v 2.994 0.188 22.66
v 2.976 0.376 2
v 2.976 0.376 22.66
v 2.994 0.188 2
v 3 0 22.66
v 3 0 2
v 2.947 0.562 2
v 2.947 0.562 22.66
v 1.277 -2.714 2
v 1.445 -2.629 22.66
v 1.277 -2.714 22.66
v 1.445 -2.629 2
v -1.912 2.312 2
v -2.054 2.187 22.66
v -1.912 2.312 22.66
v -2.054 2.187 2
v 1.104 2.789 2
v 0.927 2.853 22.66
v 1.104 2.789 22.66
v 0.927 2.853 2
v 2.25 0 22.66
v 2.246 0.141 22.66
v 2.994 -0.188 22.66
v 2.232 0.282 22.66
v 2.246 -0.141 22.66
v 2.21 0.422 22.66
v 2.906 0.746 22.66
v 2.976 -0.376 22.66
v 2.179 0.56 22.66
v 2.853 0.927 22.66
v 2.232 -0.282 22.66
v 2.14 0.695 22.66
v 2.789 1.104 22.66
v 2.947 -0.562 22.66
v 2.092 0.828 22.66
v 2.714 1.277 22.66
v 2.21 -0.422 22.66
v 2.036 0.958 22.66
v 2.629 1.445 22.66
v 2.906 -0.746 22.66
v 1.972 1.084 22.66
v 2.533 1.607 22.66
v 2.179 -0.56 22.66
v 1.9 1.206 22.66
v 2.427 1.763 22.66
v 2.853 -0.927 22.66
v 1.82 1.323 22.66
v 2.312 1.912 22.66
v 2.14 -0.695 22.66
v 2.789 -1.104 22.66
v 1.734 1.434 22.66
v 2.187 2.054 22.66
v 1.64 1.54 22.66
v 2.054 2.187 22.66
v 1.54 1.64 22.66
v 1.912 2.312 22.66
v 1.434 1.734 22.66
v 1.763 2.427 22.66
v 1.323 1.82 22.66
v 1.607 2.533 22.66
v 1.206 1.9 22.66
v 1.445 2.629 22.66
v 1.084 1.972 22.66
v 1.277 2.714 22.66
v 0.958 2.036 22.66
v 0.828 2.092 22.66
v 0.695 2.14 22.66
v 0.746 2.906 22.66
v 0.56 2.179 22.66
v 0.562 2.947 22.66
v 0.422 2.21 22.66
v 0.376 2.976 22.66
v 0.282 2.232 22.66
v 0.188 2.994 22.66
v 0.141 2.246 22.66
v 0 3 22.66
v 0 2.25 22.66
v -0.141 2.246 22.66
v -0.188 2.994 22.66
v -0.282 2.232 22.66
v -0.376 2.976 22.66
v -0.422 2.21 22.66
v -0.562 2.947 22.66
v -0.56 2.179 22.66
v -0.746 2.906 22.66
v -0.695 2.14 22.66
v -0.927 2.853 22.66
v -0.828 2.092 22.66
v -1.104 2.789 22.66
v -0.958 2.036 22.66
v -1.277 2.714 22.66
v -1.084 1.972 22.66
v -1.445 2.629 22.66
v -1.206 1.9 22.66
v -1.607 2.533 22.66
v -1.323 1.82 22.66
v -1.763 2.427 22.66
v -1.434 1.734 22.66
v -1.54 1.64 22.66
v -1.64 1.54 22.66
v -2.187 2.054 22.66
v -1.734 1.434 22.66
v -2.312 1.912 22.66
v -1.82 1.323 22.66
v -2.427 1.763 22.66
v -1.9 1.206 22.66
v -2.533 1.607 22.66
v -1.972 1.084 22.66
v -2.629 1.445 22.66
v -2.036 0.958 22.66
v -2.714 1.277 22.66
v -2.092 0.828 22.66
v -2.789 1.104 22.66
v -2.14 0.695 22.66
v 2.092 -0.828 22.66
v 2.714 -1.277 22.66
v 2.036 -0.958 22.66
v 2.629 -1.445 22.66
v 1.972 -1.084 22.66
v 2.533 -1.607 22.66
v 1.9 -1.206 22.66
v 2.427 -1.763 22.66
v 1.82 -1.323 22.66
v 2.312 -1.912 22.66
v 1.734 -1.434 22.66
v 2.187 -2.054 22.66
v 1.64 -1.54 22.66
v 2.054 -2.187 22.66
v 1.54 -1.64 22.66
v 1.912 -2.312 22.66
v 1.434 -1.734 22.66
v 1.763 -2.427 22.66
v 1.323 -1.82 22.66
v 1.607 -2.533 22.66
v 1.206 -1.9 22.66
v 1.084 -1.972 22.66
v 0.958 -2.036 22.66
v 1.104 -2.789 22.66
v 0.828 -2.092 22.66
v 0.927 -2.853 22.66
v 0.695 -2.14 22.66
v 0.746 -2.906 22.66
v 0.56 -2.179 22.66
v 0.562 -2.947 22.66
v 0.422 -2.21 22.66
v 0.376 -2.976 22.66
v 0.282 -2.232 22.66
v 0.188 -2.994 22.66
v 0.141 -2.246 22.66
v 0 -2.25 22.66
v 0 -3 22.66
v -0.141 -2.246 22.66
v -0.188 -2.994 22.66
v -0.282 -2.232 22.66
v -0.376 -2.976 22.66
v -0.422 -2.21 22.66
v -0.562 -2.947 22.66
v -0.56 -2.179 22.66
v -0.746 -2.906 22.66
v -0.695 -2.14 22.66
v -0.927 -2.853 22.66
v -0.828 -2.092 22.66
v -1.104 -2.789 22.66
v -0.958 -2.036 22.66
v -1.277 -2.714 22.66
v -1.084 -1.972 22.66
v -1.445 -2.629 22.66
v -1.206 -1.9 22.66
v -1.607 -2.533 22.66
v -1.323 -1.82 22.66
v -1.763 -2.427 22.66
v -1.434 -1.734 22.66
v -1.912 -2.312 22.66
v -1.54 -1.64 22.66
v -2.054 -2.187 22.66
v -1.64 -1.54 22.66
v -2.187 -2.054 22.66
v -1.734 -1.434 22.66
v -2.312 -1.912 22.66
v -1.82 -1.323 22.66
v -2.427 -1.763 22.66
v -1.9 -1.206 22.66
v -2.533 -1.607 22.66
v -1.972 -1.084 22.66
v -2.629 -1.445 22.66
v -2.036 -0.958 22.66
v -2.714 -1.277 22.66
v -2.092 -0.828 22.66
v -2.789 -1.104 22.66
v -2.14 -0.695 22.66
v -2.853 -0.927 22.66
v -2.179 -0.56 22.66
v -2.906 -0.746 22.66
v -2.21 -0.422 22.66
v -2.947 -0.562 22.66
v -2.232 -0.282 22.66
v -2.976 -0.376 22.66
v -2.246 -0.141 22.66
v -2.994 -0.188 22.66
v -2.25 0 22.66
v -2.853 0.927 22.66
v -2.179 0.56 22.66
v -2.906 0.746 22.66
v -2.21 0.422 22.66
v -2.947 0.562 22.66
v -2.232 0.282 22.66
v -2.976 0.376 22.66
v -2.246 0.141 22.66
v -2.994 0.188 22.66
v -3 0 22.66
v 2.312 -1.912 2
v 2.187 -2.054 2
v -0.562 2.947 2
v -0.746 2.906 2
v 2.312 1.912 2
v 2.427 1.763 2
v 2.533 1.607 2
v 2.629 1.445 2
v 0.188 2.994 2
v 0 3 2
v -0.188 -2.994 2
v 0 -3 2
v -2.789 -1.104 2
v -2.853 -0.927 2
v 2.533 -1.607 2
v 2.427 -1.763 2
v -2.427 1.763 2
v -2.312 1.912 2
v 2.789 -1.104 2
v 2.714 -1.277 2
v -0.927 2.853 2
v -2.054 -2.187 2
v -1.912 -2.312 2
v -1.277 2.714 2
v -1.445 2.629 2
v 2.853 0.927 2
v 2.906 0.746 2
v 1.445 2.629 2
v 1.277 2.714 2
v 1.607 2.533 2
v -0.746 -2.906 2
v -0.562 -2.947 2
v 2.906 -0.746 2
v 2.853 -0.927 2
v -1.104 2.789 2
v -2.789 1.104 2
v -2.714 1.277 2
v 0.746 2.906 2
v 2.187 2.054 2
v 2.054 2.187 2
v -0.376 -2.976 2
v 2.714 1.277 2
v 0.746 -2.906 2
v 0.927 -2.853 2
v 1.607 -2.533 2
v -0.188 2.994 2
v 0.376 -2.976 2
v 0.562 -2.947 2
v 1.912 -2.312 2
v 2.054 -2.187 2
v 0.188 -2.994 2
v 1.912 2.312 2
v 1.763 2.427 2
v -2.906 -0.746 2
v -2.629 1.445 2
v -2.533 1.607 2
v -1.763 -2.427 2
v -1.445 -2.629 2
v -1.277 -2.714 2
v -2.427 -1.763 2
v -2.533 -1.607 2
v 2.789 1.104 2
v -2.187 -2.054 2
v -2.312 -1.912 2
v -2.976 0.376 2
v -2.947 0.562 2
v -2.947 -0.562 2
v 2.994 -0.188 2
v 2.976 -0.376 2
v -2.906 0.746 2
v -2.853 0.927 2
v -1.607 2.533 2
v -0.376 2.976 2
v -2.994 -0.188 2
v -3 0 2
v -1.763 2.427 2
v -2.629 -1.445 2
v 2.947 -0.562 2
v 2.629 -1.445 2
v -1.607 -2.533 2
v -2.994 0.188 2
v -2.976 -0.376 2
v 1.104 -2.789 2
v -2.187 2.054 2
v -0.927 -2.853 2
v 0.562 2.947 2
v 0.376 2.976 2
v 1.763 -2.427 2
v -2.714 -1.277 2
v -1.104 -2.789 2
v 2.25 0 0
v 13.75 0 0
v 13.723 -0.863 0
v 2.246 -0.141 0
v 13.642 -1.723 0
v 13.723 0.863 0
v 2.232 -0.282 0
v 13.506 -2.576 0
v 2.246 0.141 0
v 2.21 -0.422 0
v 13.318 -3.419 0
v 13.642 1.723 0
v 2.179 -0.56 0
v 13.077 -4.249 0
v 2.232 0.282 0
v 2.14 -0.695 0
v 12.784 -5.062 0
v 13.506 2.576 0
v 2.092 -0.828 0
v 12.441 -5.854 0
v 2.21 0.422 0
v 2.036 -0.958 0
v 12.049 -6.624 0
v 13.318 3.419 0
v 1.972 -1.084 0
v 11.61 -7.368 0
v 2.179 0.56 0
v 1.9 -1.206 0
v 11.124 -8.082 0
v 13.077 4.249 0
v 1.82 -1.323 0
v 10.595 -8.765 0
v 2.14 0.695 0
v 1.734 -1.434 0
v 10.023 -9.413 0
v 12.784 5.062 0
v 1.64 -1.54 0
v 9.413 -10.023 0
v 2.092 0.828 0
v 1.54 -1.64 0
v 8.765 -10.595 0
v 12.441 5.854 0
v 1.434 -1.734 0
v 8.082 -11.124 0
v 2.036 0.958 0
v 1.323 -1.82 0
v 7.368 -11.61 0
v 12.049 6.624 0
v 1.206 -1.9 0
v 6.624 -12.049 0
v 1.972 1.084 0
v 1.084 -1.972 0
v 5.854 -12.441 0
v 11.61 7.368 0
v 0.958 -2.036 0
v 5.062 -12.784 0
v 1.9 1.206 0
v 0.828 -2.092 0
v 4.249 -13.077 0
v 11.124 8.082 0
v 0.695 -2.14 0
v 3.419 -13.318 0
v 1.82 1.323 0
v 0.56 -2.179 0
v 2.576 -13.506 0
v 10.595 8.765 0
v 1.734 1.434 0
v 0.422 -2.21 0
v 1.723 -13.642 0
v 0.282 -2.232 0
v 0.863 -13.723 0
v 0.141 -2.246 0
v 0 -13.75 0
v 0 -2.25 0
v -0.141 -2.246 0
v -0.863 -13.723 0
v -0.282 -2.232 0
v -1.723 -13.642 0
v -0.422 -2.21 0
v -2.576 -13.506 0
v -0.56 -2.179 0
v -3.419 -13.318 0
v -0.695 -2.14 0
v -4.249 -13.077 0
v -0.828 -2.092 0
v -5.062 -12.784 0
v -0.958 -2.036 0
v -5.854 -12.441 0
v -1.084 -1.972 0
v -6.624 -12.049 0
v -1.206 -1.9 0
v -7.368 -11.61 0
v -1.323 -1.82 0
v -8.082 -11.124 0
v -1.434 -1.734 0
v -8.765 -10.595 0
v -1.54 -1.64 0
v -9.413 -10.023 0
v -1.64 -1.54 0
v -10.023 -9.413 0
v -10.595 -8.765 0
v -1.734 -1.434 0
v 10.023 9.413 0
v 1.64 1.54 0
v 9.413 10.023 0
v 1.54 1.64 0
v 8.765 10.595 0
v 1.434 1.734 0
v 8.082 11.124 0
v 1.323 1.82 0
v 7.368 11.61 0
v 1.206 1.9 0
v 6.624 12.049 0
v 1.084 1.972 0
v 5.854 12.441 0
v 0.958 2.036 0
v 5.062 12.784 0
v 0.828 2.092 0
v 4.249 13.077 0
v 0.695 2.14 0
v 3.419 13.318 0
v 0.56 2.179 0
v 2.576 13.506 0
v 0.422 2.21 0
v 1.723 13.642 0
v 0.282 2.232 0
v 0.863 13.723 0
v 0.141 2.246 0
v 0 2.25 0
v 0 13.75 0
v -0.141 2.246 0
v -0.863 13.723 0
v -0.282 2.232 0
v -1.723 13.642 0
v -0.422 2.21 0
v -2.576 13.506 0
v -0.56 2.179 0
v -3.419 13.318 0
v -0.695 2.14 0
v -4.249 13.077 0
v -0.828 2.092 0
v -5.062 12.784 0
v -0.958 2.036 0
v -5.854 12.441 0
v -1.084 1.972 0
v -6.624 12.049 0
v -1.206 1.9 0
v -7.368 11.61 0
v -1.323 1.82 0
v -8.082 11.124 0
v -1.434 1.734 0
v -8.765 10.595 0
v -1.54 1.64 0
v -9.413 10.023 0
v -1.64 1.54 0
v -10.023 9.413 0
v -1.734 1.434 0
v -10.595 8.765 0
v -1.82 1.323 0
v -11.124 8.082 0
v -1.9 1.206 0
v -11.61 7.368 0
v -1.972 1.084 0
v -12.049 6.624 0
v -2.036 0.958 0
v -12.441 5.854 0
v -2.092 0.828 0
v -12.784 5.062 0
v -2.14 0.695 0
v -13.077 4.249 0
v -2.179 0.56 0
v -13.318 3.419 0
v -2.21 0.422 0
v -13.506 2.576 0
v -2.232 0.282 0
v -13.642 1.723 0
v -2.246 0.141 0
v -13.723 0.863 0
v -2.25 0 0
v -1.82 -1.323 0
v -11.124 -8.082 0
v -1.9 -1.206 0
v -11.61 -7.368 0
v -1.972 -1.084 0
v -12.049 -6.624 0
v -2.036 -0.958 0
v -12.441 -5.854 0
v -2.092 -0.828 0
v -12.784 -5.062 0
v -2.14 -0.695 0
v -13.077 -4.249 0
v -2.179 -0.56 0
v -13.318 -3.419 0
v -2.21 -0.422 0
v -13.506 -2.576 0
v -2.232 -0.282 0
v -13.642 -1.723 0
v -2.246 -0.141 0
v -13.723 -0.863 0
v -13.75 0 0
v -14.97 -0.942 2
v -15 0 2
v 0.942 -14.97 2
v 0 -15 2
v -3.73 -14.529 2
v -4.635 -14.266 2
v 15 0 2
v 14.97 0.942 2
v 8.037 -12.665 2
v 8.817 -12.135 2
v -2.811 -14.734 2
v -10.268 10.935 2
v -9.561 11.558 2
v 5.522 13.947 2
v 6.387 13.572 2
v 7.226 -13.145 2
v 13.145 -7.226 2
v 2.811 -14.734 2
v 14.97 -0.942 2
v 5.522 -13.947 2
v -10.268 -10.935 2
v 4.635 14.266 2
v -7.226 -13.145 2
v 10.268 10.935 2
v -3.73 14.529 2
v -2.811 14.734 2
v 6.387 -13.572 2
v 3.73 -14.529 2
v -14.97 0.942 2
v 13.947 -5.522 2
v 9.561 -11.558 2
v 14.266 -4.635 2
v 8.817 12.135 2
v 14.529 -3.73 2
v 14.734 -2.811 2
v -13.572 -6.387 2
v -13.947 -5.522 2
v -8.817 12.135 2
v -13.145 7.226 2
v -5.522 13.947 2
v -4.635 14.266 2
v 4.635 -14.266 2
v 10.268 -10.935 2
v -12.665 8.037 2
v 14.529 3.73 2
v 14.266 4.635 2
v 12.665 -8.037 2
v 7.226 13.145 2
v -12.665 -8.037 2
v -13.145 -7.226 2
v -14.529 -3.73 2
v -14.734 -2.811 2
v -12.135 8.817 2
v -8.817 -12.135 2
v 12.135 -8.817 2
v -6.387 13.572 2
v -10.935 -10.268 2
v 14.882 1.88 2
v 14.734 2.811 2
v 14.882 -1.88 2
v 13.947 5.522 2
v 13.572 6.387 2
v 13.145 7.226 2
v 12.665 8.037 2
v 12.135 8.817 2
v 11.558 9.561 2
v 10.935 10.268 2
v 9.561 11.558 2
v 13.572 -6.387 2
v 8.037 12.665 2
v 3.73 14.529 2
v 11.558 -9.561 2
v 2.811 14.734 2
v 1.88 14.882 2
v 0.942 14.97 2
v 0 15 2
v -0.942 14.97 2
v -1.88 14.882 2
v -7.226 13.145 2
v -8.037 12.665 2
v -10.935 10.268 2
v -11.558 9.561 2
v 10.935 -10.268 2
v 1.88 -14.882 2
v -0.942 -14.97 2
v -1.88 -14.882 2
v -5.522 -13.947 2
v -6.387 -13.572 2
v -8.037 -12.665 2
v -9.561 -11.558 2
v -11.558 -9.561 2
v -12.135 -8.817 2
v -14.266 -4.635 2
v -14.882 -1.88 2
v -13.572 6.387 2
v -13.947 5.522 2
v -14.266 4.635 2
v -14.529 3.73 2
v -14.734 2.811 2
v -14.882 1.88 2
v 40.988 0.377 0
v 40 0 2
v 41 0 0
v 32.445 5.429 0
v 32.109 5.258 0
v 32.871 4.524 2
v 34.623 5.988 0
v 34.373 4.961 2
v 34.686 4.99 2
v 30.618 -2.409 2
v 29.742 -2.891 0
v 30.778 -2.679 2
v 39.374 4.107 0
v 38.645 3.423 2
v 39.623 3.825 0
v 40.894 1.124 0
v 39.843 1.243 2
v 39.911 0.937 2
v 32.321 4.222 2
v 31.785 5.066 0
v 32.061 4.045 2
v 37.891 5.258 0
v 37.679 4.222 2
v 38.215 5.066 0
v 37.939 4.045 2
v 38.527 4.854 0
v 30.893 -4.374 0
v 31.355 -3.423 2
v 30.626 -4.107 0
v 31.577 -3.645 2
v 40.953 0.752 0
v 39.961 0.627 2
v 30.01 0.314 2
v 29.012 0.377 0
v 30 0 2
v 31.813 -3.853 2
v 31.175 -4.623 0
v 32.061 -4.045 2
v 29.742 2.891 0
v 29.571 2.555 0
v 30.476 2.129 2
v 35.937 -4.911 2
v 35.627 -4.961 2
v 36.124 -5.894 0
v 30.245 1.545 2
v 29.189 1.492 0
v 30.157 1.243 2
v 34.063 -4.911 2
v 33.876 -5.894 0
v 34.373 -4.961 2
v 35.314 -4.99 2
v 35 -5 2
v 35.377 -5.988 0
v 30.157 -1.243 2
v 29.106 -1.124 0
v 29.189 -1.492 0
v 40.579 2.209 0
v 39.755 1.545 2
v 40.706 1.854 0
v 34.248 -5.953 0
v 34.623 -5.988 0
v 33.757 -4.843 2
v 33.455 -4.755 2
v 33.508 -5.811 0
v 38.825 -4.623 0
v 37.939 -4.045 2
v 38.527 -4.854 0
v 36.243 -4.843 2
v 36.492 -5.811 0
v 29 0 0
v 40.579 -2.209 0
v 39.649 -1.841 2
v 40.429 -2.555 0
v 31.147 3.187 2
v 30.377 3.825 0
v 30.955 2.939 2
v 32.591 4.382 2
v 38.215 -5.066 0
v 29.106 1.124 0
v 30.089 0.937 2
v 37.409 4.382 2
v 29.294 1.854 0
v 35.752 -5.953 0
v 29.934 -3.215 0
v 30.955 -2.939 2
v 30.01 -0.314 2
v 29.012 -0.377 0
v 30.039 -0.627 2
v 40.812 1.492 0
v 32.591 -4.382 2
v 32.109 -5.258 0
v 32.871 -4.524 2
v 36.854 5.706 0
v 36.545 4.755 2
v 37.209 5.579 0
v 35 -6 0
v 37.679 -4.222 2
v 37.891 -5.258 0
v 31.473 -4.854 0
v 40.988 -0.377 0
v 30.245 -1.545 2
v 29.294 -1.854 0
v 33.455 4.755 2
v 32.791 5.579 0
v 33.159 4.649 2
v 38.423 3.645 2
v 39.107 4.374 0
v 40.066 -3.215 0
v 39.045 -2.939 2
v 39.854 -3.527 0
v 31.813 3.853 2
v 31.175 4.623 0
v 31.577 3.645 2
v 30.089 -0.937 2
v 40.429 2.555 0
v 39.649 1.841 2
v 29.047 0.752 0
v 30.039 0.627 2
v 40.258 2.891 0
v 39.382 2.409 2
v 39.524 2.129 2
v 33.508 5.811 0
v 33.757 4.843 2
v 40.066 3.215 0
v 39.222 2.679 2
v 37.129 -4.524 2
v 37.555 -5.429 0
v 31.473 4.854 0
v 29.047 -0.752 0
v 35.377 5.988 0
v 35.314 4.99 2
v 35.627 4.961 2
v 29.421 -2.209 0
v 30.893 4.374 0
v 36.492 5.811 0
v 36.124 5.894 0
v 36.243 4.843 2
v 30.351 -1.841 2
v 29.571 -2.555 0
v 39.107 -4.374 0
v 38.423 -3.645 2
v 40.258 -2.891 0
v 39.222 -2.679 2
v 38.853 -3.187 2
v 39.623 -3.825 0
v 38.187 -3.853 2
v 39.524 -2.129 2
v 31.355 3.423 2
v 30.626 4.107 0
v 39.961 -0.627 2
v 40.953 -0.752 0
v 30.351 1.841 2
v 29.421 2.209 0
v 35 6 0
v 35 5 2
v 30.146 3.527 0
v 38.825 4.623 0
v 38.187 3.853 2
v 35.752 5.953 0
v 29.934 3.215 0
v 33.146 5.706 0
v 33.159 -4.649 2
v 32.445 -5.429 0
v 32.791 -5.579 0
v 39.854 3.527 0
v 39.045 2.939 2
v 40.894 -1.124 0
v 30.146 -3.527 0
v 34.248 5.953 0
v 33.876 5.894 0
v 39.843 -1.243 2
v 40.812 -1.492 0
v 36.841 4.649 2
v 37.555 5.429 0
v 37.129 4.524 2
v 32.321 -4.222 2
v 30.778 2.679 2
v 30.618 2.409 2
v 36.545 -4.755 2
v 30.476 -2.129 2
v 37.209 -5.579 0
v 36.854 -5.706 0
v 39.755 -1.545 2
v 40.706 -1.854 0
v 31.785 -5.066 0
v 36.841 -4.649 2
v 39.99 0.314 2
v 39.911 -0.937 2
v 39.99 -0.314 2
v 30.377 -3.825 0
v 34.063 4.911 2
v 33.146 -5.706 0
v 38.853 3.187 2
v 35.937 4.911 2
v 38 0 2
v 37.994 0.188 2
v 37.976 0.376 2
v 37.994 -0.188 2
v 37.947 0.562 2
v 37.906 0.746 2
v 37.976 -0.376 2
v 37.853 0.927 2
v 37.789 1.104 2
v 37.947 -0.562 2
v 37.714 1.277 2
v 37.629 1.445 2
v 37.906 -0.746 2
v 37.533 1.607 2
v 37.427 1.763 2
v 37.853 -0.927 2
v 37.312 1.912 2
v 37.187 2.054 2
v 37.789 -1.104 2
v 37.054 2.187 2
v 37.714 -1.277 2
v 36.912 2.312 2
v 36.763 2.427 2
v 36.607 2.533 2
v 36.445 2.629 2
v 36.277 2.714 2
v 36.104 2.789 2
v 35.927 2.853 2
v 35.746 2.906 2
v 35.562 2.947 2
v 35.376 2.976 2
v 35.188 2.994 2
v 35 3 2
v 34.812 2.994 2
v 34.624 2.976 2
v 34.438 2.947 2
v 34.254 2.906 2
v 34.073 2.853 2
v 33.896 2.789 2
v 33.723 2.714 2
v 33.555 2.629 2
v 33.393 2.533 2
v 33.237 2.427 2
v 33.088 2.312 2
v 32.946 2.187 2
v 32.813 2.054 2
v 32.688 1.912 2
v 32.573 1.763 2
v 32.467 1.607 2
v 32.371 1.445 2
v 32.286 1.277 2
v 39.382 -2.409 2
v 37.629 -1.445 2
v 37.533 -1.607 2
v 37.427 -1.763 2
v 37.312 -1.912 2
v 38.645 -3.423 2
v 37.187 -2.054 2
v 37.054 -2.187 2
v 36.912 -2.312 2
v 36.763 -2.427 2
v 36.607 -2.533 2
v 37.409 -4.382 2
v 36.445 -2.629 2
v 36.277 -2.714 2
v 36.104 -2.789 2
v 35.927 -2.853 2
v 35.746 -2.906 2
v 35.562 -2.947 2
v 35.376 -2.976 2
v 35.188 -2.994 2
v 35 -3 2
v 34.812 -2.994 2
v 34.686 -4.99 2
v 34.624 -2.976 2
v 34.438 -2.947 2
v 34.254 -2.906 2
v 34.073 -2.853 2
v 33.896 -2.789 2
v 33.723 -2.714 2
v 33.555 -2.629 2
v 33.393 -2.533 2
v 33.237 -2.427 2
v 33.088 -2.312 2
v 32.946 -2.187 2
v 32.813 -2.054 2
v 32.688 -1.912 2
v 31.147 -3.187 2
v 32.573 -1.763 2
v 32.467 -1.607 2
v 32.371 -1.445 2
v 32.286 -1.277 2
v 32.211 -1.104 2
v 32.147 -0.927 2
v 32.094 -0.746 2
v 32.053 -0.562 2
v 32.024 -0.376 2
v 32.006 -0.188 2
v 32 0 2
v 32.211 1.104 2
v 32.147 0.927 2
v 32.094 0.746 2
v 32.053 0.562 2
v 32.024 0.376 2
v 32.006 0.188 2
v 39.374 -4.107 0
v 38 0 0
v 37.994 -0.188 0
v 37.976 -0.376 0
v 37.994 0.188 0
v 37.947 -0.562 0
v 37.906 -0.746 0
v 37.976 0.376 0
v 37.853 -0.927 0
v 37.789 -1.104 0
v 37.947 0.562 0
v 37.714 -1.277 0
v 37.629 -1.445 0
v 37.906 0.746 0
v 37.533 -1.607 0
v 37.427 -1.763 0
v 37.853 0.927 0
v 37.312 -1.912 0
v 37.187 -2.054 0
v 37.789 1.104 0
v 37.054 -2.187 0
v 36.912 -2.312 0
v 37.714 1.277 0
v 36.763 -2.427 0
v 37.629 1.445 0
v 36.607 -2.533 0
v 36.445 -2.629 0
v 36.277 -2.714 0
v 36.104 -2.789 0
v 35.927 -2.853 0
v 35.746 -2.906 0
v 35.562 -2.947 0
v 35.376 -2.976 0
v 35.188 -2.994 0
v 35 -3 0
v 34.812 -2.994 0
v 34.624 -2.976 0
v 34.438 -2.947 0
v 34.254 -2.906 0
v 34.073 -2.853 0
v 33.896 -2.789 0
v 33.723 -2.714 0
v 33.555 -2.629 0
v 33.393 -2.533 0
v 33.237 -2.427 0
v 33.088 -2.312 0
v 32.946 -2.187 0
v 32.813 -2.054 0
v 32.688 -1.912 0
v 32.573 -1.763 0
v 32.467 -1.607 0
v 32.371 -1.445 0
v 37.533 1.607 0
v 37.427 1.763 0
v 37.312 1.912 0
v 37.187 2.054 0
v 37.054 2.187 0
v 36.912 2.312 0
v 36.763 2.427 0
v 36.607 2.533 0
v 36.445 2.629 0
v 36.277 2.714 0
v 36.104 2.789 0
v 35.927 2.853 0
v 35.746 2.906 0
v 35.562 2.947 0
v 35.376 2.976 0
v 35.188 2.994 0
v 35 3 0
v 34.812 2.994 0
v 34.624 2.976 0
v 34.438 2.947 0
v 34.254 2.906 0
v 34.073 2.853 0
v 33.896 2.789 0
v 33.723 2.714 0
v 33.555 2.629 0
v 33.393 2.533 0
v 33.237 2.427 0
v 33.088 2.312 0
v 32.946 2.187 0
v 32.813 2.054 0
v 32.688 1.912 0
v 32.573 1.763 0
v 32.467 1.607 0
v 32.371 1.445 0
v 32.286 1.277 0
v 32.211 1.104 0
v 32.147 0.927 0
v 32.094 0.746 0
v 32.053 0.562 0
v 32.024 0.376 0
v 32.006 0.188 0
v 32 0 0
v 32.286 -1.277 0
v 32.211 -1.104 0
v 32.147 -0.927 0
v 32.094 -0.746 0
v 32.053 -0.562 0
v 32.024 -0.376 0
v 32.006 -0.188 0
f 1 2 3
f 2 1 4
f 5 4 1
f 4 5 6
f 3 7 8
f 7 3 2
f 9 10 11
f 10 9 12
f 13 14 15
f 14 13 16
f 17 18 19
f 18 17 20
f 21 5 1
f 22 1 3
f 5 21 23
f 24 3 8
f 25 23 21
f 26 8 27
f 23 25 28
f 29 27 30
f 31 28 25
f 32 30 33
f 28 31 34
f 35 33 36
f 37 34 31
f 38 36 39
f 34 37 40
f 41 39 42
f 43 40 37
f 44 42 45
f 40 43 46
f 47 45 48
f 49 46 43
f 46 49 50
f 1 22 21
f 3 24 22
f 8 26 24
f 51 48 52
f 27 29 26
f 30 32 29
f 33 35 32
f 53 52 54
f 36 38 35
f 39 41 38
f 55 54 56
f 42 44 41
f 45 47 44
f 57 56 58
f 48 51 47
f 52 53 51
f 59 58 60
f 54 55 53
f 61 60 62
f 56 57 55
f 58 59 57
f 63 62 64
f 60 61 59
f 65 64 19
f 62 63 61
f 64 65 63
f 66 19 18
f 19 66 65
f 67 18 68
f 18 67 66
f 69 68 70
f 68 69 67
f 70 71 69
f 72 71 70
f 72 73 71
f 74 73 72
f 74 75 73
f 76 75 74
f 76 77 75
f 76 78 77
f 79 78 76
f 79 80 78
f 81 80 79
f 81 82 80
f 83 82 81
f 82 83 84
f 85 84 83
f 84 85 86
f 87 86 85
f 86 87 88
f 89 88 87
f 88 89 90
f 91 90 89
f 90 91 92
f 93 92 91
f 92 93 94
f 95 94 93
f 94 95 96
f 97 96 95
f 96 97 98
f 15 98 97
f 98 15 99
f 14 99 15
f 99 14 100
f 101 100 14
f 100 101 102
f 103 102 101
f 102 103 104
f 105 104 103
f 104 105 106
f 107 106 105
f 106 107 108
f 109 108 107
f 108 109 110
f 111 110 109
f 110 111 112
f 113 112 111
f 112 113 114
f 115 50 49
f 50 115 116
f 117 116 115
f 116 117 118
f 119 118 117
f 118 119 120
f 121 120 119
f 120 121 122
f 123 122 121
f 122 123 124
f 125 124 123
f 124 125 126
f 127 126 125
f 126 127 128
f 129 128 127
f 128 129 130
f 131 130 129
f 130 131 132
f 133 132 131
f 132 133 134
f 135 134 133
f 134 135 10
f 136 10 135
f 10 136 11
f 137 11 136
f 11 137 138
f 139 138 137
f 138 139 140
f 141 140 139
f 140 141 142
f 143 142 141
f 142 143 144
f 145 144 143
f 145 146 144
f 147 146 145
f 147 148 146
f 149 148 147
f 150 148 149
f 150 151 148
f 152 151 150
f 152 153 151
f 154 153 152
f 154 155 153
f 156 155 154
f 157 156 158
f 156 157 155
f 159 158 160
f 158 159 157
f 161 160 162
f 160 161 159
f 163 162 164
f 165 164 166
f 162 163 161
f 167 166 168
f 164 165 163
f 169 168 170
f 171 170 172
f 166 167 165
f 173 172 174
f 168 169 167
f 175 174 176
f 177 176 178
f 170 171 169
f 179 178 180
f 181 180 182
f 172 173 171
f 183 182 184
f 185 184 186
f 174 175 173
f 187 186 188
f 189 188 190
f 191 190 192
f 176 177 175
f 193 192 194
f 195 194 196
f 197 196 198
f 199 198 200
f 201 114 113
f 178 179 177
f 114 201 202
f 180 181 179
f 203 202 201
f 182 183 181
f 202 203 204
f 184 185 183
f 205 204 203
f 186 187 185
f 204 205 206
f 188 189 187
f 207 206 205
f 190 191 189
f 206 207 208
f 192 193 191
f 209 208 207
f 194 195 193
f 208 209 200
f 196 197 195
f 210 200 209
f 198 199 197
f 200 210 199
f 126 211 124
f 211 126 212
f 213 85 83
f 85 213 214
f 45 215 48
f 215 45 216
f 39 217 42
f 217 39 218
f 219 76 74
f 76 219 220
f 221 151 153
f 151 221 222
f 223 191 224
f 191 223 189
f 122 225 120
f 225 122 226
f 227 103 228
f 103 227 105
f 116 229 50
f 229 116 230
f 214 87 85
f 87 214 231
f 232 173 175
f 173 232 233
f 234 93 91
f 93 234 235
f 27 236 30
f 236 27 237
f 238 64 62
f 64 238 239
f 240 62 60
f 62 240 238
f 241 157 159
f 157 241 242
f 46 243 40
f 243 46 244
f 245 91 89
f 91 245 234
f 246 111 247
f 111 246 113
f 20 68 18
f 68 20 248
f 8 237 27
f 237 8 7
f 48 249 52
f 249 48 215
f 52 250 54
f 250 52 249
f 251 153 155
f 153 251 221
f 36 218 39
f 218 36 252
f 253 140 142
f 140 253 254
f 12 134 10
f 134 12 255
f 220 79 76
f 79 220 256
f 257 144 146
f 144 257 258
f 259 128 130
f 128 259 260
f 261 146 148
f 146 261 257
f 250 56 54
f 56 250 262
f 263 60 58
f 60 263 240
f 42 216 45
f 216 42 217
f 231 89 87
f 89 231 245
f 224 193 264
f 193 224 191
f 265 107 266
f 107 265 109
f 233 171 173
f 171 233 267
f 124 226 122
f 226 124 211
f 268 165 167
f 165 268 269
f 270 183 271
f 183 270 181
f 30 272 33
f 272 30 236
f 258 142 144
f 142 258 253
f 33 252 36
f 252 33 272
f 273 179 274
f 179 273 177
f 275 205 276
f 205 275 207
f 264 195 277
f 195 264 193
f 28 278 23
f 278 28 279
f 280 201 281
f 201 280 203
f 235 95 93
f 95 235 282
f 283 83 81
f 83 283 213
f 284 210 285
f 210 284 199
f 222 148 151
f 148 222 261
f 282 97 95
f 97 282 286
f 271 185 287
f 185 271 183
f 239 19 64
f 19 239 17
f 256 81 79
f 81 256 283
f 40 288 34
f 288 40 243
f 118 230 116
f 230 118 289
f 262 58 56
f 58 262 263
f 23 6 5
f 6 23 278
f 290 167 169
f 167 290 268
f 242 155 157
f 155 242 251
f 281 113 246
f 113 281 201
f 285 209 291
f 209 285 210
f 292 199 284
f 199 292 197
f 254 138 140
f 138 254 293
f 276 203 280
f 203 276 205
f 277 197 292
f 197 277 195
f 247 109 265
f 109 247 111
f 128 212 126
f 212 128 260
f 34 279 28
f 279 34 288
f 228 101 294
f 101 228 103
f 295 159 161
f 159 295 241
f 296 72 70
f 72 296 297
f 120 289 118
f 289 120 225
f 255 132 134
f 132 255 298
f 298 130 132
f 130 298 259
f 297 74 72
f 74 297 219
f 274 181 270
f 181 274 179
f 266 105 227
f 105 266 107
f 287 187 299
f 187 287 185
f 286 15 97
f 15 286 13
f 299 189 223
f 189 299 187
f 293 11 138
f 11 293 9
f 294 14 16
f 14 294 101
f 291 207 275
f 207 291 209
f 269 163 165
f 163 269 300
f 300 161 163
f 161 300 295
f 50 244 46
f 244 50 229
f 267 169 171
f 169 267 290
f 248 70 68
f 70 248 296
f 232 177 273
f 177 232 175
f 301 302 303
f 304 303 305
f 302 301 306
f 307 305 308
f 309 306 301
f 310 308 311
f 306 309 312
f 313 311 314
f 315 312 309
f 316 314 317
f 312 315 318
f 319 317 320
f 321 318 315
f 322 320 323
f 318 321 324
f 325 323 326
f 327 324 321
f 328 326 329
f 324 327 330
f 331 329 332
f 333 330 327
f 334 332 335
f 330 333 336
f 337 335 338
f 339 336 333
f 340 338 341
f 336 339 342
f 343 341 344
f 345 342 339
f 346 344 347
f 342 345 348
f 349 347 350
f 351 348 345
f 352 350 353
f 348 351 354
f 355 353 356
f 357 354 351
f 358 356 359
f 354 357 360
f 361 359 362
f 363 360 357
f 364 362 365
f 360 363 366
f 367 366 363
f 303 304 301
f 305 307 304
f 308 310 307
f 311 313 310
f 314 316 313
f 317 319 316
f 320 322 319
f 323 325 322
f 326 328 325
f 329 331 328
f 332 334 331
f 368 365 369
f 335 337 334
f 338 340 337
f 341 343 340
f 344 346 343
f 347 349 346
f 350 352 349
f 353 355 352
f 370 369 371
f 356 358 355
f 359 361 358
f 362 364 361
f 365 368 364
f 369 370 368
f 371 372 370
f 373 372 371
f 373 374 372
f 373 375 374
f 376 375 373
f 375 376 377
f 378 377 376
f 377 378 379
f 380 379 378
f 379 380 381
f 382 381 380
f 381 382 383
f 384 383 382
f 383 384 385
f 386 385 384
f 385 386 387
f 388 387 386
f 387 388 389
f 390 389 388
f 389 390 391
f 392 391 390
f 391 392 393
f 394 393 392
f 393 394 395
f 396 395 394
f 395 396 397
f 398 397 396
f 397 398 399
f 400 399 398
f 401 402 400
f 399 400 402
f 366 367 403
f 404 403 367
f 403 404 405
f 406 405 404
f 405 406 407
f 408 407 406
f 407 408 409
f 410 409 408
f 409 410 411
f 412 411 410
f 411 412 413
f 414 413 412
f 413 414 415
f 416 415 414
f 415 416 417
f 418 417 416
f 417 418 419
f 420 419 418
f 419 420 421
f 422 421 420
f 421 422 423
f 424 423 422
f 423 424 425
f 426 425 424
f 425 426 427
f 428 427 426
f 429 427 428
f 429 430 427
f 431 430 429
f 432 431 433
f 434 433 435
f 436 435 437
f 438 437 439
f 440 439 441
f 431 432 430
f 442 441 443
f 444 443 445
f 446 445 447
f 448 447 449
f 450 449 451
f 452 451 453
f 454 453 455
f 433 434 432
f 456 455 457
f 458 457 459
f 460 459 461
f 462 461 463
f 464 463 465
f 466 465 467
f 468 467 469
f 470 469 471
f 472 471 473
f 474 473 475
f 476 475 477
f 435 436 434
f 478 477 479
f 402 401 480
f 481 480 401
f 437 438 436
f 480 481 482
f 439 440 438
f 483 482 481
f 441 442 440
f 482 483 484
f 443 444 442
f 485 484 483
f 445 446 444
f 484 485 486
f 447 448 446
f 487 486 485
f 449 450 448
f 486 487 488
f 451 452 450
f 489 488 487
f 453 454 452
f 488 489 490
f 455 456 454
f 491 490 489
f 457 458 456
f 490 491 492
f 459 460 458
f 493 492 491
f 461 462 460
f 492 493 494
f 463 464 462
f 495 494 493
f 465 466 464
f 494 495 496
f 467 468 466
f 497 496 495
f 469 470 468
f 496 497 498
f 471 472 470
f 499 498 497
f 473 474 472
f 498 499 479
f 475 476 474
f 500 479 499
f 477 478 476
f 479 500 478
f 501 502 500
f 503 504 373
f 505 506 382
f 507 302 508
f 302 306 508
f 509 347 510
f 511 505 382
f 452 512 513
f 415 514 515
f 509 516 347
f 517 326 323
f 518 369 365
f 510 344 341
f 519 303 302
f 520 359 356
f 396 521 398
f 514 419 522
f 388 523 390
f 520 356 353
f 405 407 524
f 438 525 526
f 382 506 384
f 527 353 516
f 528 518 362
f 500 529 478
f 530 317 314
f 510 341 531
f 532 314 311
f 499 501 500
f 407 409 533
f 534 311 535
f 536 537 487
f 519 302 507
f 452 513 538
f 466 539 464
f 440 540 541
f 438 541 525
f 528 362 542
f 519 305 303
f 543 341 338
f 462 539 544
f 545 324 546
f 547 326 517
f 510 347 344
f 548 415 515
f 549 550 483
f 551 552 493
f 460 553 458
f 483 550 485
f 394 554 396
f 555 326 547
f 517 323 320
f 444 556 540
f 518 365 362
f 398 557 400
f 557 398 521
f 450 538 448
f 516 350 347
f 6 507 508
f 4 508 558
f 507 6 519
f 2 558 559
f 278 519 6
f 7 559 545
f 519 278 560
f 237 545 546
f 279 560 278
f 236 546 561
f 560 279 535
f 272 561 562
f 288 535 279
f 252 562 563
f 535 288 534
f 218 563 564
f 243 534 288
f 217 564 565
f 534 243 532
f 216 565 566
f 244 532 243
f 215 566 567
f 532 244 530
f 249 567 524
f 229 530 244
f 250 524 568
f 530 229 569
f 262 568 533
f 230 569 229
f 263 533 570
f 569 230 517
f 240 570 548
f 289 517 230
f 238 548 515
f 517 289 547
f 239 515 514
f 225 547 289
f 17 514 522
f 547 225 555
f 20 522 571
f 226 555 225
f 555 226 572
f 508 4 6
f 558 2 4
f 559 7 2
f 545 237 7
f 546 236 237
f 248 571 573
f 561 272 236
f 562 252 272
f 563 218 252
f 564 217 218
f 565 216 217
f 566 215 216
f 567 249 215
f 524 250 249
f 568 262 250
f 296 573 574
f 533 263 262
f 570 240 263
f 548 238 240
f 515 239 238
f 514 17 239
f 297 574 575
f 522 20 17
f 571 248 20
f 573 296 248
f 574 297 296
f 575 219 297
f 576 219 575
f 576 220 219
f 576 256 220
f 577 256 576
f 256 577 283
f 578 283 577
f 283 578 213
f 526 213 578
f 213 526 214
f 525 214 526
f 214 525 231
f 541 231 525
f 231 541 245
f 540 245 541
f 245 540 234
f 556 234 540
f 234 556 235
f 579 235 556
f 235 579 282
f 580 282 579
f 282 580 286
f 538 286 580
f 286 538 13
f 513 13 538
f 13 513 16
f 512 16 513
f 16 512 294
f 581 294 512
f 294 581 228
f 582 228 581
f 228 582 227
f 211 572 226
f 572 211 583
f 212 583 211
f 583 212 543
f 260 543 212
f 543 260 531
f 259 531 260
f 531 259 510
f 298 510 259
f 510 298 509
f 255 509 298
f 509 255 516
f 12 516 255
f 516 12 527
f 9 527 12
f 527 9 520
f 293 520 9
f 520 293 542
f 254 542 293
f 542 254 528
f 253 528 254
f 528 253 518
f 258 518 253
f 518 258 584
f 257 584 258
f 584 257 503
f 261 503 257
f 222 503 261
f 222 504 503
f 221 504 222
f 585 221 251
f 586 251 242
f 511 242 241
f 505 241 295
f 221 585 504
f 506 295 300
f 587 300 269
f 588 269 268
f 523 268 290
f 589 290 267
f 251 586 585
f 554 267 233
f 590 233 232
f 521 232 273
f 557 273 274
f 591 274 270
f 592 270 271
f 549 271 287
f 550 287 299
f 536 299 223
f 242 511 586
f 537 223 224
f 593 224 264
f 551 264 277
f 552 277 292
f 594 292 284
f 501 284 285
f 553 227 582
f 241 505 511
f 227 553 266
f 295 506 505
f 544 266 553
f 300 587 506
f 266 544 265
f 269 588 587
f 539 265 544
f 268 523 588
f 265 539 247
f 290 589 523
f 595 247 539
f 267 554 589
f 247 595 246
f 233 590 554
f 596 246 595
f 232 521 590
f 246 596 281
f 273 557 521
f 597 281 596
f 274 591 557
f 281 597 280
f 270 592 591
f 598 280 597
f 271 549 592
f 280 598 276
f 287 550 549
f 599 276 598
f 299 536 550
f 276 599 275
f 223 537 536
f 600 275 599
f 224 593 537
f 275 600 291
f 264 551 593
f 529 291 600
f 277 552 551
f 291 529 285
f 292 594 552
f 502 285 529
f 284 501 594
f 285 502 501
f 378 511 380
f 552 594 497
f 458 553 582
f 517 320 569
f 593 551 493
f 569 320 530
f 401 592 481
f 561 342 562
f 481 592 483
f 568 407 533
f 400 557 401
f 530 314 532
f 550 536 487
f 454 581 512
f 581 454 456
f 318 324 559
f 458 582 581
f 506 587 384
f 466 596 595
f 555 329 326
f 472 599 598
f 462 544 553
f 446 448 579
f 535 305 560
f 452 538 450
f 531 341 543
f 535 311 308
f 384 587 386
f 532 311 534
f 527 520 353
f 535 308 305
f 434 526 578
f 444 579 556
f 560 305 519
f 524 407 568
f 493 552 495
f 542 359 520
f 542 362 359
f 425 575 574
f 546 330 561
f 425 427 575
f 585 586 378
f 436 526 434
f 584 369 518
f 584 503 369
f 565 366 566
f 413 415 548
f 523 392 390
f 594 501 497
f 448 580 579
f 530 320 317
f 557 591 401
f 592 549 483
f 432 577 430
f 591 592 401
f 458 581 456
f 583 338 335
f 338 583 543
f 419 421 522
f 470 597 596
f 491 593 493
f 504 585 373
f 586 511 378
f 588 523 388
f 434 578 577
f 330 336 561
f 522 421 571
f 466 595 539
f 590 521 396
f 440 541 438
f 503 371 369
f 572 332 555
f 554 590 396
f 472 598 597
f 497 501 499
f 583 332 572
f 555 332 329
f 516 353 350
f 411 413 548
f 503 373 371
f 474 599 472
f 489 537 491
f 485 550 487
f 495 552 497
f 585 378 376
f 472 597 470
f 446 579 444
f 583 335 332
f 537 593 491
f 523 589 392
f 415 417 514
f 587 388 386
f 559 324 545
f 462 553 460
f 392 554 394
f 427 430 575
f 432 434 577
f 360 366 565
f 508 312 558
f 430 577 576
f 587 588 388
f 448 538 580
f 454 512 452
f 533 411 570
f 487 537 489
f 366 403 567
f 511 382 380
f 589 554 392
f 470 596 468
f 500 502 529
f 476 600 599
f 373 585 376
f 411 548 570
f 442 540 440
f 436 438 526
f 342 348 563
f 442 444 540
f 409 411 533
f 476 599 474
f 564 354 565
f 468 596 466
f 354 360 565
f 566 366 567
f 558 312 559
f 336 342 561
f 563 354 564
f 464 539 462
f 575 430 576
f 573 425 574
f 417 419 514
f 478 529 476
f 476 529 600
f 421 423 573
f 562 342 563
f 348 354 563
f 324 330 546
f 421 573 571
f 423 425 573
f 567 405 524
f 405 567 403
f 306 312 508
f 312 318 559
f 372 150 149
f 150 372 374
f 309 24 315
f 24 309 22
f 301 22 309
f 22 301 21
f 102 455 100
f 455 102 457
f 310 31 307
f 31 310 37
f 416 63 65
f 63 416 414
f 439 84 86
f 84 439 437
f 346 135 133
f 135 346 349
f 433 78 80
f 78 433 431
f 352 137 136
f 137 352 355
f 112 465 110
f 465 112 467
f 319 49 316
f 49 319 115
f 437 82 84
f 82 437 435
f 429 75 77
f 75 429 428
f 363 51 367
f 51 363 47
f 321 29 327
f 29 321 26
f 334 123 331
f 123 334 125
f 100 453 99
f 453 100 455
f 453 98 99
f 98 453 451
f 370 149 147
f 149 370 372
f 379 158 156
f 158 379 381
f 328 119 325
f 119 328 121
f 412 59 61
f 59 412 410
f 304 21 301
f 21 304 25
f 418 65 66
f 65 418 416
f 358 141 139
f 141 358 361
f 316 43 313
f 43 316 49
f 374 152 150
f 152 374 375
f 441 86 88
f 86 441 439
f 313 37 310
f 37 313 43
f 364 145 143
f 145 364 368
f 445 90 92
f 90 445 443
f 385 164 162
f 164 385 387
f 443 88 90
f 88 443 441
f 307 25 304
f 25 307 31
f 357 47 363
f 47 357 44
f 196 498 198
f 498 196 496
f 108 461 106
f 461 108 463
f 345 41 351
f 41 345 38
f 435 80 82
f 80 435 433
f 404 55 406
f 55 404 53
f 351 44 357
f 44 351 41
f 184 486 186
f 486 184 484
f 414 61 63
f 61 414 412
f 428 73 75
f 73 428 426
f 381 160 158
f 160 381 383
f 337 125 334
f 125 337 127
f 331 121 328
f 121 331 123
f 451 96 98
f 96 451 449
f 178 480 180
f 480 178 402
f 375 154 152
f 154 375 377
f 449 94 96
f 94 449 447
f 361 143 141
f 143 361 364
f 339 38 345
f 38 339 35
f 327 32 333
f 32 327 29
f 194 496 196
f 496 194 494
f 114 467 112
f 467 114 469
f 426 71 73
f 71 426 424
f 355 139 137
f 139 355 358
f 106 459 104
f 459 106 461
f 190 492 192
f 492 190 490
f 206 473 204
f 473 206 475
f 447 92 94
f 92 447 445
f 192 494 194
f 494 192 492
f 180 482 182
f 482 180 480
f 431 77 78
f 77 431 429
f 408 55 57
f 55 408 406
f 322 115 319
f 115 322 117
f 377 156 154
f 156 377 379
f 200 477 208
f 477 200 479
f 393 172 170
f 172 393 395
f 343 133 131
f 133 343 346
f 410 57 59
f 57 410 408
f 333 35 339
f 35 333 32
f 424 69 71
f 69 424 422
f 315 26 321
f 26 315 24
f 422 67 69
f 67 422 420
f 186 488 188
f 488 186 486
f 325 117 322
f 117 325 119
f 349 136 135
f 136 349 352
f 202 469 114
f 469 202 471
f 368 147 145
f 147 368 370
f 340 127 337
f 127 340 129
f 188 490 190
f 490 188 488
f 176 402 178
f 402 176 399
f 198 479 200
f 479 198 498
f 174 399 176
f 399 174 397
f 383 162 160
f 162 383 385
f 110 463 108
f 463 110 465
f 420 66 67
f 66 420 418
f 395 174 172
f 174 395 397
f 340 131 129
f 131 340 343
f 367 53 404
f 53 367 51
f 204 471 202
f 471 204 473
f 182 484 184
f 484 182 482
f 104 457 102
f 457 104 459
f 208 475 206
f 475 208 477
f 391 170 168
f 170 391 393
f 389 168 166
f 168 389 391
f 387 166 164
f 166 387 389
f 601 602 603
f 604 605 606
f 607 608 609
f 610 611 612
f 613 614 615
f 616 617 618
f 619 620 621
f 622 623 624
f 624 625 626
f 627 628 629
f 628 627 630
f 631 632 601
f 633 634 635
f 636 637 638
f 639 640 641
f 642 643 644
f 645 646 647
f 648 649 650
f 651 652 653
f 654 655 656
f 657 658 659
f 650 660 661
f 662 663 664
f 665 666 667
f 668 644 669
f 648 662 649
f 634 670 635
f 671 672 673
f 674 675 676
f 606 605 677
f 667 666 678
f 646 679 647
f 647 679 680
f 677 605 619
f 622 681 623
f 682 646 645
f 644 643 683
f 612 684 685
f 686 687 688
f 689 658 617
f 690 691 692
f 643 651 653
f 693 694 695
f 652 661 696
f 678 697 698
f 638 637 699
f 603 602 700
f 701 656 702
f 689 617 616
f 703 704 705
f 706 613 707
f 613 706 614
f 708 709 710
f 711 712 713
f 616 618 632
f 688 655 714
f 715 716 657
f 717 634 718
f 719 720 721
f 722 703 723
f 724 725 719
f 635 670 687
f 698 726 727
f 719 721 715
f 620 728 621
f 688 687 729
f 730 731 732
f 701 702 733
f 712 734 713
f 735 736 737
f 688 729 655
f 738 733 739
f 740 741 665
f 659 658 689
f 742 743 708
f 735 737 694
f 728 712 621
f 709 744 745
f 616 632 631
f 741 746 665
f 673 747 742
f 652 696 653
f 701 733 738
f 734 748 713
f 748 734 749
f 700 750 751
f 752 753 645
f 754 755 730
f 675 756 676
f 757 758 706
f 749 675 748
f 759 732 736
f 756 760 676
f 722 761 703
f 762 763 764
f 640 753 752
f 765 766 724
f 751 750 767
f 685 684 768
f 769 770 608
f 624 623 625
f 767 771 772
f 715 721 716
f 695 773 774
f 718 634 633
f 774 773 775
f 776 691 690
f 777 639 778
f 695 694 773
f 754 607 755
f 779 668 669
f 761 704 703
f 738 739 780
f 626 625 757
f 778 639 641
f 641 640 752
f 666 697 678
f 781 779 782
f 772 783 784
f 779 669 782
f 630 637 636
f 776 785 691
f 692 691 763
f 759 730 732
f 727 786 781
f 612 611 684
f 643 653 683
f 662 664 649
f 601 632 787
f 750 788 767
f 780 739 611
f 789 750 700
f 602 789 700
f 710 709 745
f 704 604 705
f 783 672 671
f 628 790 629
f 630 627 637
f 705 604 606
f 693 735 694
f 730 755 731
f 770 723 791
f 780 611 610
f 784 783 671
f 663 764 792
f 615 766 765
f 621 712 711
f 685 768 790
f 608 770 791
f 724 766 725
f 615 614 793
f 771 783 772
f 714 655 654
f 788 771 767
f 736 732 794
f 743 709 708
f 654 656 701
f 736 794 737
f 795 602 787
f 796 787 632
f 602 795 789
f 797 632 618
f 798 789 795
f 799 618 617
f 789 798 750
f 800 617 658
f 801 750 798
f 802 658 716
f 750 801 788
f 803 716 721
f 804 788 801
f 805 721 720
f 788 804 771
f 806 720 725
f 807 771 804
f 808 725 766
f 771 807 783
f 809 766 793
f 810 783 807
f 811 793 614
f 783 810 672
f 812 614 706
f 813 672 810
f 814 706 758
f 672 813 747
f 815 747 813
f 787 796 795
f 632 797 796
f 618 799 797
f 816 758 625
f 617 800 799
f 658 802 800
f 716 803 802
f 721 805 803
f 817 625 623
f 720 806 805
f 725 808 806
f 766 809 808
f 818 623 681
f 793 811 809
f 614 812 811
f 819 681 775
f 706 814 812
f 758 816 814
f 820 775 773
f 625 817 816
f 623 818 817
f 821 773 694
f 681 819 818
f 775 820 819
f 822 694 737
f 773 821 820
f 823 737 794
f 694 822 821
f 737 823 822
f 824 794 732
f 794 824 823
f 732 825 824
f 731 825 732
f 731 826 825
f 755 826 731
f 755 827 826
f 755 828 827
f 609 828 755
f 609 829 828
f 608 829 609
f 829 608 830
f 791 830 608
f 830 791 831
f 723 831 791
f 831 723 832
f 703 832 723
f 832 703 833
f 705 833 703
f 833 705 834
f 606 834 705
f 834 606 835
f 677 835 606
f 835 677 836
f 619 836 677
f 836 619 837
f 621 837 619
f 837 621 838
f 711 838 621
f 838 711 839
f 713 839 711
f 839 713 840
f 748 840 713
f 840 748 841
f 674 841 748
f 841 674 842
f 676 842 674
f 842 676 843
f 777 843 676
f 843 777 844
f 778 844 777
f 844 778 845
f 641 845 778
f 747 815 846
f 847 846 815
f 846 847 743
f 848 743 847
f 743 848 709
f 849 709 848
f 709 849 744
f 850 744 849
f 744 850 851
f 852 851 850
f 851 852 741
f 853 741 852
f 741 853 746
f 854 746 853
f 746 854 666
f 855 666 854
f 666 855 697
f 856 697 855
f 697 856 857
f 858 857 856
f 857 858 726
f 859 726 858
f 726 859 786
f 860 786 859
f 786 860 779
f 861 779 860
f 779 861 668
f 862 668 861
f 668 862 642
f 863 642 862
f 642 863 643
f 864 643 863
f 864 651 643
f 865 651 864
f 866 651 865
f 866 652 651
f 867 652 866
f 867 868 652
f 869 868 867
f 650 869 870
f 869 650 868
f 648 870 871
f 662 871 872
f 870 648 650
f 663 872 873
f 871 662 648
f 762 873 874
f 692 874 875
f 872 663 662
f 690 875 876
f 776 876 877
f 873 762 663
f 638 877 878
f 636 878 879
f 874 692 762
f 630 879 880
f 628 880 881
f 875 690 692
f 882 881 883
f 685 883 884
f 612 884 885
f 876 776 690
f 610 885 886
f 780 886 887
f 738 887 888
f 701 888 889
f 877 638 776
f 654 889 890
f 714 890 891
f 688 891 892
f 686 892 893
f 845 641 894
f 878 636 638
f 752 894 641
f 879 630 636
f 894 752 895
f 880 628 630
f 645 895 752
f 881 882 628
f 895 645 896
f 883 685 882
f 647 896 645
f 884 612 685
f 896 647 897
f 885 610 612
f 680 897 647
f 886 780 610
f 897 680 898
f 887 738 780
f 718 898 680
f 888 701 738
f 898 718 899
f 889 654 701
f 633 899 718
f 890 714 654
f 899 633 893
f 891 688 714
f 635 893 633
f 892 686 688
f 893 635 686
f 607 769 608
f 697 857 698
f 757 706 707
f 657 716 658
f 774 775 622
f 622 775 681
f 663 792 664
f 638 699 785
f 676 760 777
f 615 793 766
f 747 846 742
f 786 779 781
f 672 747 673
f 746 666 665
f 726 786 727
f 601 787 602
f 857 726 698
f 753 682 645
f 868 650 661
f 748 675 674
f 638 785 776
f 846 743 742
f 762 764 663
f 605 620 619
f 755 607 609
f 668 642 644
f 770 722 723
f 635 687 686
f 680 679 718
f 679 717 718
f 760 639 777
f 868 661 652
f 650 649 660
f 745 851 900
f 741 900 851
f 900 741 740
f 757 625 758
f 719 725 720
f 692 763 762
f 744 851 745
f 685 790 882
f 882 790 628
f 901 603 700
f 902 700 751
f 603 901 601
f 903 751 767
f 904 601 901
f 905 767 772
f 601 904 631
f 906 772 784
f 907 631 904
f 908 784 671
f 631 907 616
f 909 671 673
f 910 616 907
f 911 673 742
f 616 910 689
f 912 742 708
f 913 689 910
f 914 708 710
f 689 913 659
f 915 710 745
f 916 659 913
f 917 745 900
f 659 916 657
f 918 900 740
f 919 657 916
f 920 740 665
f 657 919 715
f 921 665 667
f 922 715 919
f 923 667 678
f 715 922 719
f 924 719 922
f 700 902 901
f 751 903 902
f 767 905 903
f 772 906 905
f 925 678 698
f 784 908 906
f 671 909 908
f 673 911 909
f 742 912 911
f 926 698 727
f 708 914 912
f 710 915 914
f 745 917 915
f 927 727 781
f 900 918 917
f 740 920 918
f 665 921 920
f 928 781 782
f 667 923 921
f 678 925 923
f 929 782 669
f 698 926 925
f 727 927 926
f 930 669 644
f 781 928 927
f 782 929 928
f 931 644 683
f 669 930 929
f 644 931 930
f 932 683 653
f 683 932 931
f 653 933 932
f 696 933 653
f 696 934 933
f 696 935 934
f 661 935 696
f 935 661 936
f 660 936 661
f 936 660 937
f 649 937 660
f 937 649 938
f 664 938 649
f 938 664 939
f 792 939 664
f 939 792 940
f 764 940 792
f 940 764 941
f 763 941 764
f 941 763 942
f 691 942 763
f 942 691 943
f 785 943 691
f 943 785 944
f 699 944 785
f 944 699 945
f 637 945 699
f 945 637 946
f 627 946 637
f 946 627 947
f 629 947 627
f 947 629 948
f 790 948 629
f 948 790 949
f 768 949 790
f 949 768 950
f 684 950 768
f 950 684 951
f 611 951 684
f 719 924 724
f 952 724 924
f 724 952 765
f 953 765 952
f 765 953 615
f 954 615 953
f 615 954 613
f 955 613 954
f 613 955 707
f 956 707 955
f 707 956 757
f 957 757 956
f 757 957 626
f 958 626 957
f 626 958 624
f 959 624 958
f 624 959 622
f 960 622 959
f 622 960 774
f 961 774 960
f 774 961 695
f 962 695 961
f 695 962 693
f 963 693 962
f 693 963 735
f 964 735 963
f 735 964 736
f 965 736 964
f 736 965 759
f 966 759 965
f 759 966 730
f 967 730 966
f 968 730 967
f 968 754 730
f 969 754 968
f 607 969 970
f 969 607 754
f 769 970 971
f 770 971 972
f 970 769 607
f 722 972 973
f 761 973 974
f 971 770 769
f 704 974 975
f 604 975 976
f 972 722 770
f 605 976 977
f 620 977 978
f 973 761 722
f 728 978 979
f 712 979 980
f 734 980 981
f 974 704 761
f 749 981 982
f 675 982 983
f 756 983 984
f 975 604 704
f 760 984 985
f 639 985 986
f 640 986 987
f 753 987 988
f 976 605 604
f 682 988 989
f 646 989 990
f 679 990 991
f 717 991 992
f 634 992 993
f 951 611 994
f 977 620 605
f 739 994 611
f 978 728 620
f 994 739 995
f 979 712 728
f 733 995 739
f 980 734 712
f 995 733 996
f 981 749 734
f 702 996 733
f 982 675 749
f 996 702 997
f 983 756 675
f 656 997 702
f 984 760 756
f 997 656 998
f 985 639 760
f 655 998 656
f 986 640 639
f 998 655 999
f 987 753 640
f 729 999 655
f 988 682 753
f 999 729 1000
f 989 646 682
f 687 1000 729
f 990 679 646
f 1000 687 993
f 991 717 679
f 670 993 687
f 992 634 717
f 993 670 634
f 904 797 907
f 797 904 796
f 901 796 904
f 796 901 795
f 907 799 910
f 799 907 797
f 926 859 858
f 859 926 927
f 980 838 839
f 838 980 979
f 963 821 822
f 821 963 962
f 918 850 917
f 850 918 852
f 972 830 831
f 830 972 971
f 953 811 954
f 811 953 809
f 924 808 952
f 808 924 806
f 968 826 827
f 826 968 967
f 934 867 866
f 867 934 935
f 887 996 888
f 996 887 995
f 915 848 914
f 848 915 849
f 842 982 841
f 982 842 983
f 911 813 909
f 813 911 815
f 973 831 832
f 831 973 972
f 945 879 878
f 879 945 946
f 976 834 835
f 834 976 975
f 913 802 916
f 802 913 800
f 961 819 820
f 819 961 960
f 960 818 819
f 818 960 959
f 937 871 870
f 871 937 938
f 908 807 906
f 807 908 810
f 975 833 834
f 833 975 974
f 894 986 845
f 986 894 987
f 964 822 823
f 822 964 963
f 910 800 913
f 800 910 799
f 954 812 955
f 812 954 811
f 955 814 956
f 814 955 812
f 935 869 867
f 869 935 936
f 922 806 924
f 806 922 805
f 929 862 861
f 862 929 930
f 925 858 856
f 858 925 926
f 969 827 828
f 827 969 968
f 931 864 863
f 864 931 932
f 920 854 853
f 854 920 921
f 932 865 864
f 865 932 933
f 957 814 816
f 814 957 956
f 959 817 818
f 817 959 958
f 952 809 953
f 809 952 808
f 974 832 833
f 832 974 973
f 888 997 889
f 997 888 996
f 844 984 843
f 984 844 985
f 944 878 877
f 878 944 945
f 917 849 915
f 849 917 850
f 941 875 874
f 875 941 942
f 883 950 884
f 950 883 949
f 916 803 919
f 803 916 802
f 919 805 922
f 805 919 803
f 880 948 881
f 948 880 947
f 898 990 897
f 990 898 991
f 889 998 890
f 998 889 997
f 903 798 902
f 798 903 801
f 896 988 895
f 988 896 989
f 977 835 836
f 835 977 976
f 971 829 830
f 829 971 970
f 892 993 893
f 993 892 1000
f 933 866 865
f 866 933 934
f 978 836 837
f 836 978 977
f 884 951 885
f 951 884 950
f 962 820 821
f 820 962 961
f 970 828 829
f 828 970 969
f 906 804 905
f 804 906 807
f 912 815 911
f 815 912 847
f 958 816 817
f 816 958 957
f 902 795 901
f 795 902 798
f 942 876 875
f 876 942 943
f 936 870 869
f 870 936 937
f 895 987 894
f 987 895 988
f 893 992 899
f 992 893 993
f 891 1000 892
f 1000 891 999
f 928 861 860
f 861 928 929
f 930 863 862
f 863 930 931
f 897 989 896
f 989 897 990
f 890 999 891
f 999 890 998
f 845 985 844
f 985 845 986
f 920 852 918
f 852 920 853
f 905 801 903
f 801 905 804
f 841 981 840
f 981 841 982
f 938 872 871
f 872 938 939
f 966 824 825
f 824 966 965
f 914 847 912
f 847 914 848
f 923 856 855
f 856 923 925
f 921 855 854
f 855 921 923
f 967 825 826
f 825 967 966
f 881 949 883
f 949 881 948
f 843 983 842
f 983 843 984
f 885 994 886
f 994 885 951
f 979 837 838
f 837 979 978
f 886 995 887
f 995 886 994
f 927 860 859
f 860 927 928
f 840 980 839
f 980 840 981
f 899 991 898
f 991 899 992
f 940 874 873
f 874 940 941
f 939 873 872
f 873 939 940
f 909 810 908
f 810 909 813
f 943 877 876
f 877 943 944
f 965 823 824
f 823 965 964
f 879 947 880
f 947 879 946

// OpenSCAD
/*  
**  Name:  Customizable Filament Port_3d_model
**  Author:  Chris Benson  @TheExtruder
**  Created:  1/22/2017
*/
/*[Global]*/
part = "both" ; // [first:Plug Only,second:Cap Only,both:Plug and Cap]

/*[Base]*/
//in millimeters
baseDiameter = 30;
//in millimeters
baseChamferDiameter = 27.5;
//in millimeters
baseHeight = 2;

/*[Plug]*/
//in millimeters
plugLength = 18.66;
//in millimeters
plugOD = 6;
//in millimeters
plugID = 4.5;

/*[Cap]*/
//in millimeters
capDiameter = 12;
//in millimeters
capChamferDiameter = 10;
//in millimeters
capHeight = 2;

/*[Hidden]*/
$fn = 100;

print_part();

module print_part() {
	if (part == "first") {
        Port();
	} else if (part == "second") {
        Cap();
	} else if (part == "both") {
		PortAndCap();
	} else {
		PortAndCap();
	}
}

module PortAndCap(){
    Port();
    translate([max(baseDiameter, capDiameter) + 5,0,0])
        Cap();
}

module Port(){
    difference(){
        union(){
            cylinder(baseHeight+plugLength+capHeight, d=plugOD, false);
            cylinder(baseHeight, d1=baseChamferDiameter, d2=baseDiameter, false);
        }
        cylinder(baseHeight+plugLength+capHeight, d=plugID, false);
    }
}

module Cap(){
    difference(){
        cylinder(capHeight, d1=capDiameter, d2=capChamferDiameter, false);
        cylinder(capHeight, d=plugOD, false);
    }
}
